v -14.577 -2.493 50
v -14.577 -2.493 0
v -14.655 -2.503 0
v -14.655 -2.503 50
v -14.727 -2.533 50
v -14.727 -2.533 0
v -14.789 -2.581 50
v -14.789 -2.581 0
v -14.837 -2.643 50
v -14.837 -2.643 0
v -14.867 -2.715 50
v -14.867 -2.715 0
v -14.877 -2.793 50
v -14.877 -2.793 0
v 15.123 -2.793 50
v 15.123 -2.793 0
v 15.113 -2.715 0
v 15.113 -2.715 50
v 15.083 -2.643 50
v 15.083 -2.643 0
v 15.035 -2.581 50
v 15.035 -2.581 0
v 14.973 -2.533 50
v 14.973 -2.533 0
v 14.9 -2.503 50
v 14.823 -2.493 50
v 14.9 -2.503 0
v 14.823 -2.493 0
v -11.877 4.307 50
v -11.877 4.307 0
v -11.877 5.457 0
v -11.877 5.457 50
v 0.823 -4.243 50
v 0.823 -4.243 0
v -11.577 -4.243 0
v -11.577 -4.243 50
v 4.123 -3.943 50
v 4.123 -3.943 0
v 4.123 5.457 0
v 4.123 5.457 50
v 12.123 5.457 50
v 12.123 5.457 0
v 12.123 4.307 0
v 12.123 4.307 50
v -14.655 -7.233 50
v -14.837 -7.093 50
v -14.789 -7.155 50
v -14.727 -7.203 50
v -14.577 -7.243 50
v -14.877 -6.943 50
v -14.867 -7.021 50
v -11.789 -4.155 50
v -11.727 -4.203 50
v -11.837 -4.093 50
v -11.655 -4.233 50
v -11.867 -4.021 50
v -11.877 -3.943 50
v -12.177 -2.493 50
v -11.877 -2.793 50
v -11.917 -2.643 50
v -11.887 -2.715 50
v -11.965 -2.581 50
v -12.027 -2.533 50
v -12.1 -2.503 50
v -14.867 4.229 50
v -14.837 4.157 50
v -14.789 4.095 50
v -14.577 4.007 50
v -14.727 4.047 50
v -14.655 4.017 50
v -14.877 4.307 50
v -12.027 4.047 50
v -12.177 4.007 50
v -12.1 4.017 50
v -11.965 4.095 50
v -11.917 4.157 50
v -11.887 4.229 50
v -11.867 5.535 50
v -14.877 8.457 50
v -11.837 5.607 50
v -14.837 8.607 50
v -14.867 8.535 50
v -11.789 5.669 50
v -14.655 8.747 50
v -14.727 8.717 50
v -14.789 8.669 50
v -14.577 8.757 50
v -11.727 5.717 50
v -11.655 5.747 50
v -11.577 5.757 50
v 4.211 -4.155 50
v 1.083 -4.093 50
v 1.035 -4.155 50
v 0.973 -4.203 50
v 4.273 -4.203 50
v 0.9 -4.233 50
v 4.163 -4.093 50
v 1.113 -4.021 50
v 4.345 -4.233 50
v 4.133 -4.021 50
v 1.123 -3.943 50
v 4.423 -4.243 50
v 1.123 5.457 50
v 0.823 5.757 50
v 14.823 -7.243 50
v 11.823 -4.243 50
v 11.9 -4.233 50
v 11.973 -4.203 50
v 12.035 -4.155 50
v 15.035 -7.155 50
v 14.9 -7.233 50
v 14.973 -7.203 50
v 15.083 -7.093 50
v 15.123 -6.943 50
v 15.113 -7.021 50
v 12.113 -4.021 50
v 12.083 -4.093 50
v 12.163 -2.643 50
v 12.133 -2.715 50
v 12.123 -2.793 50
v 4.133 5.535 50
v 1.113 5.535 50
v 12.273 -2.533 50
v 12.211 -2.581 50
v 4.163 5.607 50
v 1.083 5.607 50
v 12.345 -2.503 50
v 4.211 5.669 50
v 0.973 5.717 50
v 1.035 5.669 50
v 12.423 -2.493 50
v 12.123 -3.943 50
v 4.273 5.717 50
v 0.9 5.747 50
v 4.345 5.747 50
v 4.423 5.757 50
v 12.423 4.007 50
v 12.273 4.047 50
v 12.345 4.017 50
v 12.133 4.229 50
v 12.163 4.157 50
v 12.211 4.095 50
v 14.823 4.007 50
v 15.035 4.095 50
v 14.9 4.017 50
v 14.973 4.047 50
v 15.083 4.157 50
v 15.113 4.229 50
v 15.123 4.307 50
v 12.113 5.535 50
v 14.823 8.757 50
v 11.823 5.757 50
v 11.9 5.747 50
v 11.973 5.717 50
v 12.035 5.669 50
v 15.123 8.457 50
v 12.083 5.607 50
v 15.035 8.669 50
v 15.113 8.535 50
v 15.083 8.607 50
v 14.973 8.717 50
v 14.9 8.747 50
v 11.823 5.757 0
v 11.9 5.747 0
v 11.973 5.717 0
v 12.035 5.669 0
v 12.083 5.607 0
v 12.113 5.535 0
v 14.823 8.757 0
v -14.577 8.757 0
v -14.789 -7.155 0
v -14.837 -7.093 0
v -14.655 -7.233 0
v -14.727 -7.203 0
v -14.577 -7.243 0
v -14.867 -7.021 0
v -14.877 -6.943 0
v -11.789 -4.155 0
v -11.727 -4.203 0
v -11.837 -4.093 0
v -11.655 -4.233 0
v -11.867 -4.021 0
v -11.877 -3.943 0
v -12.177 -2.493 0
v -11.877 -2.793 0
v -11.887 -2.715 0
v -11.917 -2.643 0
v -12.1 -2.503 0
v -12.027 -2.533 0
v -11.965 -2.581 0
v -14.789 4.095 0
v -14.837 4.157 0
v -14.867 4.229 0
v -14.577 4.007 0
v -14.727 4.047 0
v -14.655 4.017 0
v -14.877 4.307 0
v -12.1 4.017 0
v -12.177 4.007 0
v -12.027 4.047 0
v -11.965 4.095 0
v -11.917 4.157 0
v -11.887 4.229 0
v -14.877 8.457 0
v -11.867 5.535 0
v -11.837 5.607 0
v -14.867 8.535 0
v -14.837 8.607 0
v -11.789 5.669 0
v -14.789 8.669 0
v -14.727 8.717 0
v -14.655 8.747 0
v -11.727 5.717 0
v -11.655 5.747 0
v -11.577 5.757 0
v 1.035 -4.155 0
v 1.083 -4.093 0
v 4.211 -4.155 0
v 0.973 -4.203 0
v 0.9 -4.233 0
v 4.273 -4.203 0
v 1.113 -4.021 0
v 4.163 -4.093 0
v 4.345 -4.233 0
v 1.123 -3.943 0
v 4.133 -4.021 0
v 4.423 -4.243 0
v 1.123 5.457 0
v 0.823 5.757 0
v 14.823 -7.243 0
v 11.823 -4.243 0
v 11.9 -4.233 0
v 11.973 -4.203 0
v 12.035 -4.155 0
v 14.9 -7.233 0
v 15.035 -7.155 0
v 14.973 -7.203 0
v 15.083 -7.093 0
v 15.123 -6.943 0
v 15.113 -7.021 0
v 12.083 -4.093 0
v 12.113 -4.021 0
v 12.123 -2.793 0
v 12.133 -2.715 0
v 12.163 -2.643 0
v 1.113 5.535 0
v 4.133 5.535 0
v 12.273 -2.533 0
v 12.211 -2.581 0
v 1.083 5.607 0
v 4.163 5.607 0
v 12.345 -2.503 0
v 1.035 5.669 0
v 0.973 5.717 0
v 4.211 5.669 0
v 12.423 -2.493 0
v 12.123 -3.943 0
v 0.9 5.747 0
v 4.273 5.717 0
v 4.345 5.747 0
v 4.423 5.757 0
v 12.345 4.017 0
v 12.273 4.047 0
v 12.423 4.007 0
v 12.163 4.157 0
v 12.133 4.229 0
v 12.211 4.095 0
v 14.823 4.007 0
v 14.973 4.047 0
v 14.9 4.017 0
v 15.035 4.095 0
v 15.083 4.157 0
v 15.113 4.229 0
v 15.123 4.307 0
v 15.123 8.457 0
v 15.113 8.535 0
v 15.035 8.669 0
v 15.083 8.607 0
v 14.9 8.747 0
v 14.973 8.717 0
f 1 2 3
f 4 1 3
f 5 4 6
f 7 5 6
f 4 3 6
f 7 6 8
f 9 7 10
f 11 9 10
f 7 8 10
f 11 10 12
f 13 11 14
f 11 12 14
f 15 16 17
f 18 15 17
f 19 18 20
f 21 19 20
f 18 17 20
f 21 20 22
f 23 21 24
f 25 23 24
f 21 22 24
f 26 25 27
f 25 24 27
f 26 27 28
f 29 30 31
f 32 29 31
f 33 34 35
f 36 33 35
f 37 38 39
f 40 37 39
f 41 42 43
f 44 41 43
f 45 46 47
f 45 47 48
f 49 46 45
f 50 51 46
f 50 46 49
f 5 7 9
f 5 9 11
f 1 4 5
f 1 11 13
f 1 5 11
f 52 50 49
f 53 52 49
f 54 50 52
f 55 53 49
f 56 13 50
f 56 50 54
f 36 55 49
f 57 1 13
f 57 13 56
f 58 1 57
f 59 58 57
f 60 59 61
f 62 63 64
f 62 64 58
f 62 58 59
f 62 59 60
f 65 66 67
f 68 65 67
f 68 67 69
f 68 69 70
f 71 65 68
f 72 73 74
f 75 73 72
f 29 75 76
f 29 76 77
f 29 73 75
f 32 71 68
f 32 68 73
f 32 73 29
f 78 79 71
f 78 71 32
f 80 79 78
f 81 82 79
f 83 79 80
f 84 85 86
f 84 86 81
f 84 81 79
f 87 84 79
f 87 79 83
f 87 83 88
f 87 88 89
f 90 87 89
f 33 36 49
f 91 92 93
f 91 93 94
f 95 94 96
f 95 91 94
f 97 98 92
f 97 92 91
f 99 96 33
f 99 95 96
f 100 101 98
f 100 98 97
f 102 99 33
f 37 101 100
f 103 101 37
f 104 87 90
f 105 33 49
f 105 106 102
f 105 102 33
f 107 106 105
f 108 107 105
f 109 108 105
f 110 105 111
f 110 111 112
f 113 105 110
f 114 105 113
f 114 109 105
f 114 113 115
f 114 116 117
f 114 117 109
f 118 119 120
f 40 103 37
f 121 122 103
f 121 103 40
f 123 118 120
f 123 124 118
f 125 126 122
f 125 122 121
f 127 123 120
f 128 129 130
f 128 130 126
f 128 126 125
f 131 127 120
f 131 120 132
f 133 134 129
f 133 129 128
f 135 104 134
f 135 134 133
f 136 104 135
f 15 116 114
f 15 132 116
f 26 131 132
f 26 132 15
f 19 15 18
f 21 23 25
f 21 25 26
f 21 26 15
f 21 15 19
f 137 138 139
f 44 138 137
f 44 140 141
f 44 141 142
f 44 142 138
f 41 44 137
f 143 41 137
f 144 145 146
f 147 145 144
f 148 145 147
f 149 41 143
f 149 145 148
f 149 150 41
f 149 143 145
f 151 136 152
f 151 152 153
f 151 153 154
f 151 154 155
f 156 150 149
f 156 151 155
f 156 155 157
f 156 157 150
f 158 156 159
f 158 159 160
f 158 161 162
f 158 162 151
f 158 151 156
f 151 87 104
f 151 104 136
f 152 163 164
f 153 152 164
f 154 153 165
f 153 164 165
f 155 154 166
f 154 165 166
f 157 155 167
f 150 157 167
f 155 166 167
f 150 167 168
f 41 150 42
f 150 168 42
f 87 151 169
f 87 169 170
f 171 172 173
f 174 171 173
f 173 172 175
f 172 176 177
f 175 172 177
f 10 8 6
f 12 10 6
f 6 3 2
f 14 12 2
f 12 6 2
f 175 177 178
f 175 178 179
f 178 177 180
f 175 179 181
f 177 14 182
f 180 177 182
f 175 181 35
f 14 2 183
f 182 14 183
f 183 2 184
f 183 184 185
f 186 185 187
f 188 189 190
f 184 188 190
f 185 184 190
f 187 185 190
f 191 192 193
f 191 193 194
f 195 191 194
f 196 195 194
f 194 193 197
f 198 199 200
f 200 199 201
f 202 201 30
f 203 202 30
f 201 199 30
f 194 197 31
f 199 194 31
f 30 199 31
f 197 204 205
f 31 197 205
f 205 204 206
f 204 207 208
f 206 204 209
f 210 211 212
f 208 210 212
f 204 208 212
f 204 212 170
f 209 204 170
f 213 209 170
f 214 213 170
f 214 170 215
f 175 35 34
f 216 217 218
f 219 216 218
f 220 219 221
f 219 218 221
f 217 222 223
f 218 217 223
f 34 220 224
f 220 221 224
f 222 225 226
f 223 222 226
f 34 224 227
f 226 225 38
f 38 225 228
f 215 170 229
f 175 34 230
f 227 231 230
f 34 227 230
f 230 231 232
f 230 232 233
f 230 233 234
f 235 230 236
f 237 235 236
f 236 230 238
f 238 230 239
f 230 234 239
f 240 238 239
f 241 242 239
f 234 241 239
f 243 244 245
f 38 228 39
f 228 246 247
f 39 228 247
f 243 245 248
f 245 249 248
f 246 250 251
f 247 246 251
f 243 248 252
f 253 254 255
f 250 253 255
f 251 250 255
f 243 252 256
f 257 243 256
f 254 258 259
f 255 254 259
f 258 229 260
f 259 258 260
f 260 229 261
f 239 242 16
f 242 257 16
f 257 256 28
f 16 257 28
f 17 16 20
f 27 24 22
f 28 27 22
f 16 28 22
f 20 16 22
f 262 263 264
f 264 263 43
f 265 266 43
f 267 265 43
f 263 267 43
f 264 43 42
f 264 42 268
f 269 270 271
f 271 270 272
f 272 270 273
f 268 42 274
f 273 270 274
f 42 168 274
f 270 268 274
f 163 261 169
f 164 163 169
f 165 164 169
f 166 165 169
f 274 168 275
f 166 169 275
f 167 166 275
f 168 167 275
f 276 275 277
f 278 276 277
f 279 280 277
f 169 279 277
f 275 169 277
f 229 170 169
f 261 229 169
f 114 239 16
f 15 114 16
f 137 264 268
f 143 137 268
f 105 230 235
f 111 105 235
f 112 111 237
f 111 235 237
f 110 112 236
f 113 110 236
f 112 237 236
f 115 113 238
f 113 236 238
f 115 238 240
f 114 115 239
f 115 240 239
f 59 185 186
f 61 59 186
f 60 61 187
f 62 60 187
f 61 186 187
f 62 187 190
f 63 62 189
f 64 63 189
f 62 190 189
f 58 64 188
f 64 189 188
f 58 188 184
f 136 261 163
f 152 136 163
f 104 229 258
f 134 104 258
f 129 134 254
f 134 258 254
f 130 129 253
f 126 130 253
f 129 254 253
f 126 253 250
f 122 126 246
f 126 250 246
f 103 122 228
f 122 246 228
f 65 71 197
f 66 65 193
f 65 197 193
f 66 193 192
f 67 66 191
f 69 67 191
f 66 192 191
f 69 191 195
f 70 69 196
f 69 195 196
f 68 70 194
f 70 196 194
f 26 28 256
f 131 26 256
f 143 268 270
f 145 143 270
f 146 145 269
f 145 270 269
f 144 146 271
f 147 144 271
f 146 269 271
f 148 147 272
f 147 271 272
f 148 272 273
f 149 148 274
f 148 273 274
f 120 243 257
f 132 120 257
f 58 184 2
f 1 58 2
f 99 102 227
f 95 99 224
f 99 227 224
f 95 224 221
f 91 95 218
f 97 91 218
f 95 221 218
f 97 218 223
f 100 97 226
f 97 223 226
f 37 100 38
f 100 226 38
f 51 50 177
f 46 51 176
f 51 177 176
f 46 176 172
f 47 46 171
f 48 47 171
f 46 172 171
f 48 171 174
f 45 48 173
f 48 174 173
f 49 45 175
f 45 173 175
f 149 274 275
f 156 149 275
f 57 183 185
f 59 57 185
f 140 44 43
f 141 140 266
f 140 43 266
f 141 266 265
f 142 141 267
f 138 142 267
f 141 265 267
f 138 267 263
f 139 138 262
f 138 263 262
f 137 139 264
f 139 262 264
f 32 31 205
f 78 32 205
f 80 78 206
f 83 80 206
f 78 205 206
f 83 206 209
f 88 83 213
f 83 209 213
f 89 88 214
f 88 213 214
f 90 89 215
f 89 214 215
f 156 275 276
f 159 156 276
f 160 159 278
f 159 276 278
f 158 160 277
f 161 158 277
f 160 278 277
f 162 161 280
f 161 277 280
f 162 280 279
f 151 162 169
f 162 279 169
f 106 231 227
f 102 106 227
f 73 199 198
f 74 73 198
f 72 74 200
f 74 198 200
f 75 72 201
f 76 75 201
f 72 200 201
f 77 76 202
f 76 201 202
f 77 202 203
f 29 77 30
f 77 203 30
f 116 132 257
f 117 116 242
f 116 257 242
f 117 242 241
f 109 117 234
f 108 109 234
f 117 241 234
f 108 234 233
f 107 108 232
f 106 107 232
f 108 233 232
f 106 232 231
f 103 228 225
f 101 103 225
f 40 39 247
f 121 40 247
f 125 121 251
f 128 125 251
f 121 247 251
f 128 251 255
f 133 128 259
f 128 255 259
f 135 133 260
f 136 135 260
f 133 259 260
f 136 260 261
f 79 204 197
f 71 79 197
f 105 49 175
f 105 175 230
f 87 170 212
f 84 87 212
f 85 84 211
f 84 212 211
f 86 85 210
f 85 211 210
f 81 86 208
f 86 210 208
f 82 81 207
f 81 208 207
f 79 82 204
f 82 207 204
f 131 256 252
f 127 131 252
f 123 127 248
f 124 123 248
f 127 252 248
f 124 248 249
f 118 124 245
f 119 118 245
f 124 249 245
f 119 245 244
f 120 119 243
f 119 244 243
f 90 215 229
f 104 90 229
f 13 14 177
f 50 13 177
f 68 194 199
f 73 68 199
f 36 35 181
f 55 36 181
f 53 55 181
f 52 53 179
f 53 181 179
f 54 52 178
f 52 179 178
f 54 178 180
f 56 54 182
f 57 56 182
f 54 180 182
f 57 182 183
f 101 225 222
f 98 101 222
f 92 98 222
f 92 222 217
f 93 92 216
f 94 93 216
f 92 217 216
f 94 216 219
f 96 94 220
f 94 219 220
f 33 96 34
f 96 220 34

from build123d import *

# Parameters (mm, degrees)
EXTRUDE_1_DEPTH = 50


with BuildPart() as part:
    # 草图1 → 凸台-拉伸1 (new body)
    with BuildSketch(Plane.XY):
        with BuildLine():
            Line((-11.577197952, 5.757012623), (0.822802048, 5.757012623))
            ThreePointArc((0.822802048, 5.757012623), (1.034934082, 5.669144657), (1.122802048, 5.457012623))
            Line((1.122802048, 5.457012623), (1.122802048, -3.942987377))
            ThreePointArc((1.122802048, -3.942987377), (1.034934082, -4.155119412), (0.822802048, -4.242987377))
            Line((0.822802048, -4.242987377), (-11.577197952, -4.242987377))
            ThreePointArc((-11.577197952, -4.242987377), (-11.789329987, -4.155119412), (-11.877197952, -3.942987377))
            Line((-11.877197952, -3.942987377), (-11.877197952, -2.792987377))
            ThreePointArc((-11.877197952, -2.792987377), (-11.965065918, -2.580855343), (-12.177197952, -2.492987377))
            Line((-12.177197952, -2.492987377), (-14.577197952, -2.492987377))
            ThreePointArc((-14.577197952, -2.492987377), (-14.789329987, -2.580855343), (-14.877197952, -2.792987377))
            Line((-14.877197952, -2.792987377), (-14.877197952, -6.942987377))
            ThreePointArc((-14.877197952, -6.942987377), (-14.789329987, -7.155119412), (-14.577197952, -7.242987377))
            Line((-14.577197952, -7.242987377), (14.822802048, -7.242987377))
            ThreePointArc((14.822802048, -7.242987377), (15.034934082, -7.155119412), (15.122802048, -6.942987377))
            Line((15.122802048, -6.942987377), (15.122802048, -2.792987377))
            ThreePointArc((15.122802048, -2.792987377), (15.034934082, -2.580855343), (14.822802048, -2.492987377))
            Line((14.822802048, -2.492987377), (12.422802048, -2.492987377))
            ThreePointArc((12.422802048, -2.492987377), (12.210670013, -2.580855343), (12.122802048, -2.792987377))
            Line((12.122802048, -2.792987377), (12.122802048, -3.942987377))
            ThreePointArc((12.122802048, -3.942987377), (12.034934082, -4.155119412), (11.822802048, -4.242987377))
            Line((11.822802048, -4.242987377), (4.422802048, -4.242987377))
            ThreePointArc((4.422802048, -4.242987377), (4.210670013, -4.155119412), (4.122802048, -3.942987377))
            Line((4.122802048, -3.942987377), (4.122802048, 5.457012623))
            ThreePointArc((4.122802048, 5.457012623), (4.210670013, 5.669144657), (4.422802048, 5.757012623))
            Line((4.422802048, 5.757012623), (11.822802048, 5.757012623))
            ThreePointArc((11.822802048, 5.757012623), (12.034934082, 5.669144657), (12.122802048, 5.457012623))
            Line((12.122802048, 5.457012623), (12.122802048, 4.307012623))
            ThreePointArc((12.122802048, 4.307012623), (12.210670013, 4.094880588), (12.422802048, 4.007012623))
            Line((12.422802048, 4.007012623), (14.822802048, 4.007012623))
            ThreePointArc((14.822802048, 4.007012623), (15.034934082, 4.094880588), (15.122802048, 4.307012623))
            Line((15.122802048, 4.307012623), (15.122802048, 8.457012623))
            ThreePointArc((15.122802048, 8.457012623), (15.034934082, 8.669144657), (14.822802048, 8.757012623))
            Line((14.822802048, 8.757012623), (-14.577197952, 8.757012623))
            ThreePointArc((-14.577197952, 8.757012623), (-14.789329987, 8.669144657), (-14.877197952, 8.457012623))
            Line((-14.877197952, 8.457012623), (-14.877197952, 4.307012623))
            ThreePointArc((-14.877197952, 4.307012623), (-14.789329987, 4.094880588), (-14.577197952, 4.007012623))
            Line((-14.577197952, 4.007012623), (-12.177197952, 4.007012623))
            ThreePointArc((-12.177197952, 4.007012623), (-11.965065918, 4.094880588), (-11.877197952, 4.307012623))
            Line((-11.877197952, 4.307012623), (-11.877197952, 5.457012623))
            ThreePointArc((-11.877197952, 5.457012623), (-11.789329987, 5.669144657), (-11.577197952, 5.757012623))
        make_face()
    extrude(amount=EXTRUDE_1_DEPTH)


solid = part.part
